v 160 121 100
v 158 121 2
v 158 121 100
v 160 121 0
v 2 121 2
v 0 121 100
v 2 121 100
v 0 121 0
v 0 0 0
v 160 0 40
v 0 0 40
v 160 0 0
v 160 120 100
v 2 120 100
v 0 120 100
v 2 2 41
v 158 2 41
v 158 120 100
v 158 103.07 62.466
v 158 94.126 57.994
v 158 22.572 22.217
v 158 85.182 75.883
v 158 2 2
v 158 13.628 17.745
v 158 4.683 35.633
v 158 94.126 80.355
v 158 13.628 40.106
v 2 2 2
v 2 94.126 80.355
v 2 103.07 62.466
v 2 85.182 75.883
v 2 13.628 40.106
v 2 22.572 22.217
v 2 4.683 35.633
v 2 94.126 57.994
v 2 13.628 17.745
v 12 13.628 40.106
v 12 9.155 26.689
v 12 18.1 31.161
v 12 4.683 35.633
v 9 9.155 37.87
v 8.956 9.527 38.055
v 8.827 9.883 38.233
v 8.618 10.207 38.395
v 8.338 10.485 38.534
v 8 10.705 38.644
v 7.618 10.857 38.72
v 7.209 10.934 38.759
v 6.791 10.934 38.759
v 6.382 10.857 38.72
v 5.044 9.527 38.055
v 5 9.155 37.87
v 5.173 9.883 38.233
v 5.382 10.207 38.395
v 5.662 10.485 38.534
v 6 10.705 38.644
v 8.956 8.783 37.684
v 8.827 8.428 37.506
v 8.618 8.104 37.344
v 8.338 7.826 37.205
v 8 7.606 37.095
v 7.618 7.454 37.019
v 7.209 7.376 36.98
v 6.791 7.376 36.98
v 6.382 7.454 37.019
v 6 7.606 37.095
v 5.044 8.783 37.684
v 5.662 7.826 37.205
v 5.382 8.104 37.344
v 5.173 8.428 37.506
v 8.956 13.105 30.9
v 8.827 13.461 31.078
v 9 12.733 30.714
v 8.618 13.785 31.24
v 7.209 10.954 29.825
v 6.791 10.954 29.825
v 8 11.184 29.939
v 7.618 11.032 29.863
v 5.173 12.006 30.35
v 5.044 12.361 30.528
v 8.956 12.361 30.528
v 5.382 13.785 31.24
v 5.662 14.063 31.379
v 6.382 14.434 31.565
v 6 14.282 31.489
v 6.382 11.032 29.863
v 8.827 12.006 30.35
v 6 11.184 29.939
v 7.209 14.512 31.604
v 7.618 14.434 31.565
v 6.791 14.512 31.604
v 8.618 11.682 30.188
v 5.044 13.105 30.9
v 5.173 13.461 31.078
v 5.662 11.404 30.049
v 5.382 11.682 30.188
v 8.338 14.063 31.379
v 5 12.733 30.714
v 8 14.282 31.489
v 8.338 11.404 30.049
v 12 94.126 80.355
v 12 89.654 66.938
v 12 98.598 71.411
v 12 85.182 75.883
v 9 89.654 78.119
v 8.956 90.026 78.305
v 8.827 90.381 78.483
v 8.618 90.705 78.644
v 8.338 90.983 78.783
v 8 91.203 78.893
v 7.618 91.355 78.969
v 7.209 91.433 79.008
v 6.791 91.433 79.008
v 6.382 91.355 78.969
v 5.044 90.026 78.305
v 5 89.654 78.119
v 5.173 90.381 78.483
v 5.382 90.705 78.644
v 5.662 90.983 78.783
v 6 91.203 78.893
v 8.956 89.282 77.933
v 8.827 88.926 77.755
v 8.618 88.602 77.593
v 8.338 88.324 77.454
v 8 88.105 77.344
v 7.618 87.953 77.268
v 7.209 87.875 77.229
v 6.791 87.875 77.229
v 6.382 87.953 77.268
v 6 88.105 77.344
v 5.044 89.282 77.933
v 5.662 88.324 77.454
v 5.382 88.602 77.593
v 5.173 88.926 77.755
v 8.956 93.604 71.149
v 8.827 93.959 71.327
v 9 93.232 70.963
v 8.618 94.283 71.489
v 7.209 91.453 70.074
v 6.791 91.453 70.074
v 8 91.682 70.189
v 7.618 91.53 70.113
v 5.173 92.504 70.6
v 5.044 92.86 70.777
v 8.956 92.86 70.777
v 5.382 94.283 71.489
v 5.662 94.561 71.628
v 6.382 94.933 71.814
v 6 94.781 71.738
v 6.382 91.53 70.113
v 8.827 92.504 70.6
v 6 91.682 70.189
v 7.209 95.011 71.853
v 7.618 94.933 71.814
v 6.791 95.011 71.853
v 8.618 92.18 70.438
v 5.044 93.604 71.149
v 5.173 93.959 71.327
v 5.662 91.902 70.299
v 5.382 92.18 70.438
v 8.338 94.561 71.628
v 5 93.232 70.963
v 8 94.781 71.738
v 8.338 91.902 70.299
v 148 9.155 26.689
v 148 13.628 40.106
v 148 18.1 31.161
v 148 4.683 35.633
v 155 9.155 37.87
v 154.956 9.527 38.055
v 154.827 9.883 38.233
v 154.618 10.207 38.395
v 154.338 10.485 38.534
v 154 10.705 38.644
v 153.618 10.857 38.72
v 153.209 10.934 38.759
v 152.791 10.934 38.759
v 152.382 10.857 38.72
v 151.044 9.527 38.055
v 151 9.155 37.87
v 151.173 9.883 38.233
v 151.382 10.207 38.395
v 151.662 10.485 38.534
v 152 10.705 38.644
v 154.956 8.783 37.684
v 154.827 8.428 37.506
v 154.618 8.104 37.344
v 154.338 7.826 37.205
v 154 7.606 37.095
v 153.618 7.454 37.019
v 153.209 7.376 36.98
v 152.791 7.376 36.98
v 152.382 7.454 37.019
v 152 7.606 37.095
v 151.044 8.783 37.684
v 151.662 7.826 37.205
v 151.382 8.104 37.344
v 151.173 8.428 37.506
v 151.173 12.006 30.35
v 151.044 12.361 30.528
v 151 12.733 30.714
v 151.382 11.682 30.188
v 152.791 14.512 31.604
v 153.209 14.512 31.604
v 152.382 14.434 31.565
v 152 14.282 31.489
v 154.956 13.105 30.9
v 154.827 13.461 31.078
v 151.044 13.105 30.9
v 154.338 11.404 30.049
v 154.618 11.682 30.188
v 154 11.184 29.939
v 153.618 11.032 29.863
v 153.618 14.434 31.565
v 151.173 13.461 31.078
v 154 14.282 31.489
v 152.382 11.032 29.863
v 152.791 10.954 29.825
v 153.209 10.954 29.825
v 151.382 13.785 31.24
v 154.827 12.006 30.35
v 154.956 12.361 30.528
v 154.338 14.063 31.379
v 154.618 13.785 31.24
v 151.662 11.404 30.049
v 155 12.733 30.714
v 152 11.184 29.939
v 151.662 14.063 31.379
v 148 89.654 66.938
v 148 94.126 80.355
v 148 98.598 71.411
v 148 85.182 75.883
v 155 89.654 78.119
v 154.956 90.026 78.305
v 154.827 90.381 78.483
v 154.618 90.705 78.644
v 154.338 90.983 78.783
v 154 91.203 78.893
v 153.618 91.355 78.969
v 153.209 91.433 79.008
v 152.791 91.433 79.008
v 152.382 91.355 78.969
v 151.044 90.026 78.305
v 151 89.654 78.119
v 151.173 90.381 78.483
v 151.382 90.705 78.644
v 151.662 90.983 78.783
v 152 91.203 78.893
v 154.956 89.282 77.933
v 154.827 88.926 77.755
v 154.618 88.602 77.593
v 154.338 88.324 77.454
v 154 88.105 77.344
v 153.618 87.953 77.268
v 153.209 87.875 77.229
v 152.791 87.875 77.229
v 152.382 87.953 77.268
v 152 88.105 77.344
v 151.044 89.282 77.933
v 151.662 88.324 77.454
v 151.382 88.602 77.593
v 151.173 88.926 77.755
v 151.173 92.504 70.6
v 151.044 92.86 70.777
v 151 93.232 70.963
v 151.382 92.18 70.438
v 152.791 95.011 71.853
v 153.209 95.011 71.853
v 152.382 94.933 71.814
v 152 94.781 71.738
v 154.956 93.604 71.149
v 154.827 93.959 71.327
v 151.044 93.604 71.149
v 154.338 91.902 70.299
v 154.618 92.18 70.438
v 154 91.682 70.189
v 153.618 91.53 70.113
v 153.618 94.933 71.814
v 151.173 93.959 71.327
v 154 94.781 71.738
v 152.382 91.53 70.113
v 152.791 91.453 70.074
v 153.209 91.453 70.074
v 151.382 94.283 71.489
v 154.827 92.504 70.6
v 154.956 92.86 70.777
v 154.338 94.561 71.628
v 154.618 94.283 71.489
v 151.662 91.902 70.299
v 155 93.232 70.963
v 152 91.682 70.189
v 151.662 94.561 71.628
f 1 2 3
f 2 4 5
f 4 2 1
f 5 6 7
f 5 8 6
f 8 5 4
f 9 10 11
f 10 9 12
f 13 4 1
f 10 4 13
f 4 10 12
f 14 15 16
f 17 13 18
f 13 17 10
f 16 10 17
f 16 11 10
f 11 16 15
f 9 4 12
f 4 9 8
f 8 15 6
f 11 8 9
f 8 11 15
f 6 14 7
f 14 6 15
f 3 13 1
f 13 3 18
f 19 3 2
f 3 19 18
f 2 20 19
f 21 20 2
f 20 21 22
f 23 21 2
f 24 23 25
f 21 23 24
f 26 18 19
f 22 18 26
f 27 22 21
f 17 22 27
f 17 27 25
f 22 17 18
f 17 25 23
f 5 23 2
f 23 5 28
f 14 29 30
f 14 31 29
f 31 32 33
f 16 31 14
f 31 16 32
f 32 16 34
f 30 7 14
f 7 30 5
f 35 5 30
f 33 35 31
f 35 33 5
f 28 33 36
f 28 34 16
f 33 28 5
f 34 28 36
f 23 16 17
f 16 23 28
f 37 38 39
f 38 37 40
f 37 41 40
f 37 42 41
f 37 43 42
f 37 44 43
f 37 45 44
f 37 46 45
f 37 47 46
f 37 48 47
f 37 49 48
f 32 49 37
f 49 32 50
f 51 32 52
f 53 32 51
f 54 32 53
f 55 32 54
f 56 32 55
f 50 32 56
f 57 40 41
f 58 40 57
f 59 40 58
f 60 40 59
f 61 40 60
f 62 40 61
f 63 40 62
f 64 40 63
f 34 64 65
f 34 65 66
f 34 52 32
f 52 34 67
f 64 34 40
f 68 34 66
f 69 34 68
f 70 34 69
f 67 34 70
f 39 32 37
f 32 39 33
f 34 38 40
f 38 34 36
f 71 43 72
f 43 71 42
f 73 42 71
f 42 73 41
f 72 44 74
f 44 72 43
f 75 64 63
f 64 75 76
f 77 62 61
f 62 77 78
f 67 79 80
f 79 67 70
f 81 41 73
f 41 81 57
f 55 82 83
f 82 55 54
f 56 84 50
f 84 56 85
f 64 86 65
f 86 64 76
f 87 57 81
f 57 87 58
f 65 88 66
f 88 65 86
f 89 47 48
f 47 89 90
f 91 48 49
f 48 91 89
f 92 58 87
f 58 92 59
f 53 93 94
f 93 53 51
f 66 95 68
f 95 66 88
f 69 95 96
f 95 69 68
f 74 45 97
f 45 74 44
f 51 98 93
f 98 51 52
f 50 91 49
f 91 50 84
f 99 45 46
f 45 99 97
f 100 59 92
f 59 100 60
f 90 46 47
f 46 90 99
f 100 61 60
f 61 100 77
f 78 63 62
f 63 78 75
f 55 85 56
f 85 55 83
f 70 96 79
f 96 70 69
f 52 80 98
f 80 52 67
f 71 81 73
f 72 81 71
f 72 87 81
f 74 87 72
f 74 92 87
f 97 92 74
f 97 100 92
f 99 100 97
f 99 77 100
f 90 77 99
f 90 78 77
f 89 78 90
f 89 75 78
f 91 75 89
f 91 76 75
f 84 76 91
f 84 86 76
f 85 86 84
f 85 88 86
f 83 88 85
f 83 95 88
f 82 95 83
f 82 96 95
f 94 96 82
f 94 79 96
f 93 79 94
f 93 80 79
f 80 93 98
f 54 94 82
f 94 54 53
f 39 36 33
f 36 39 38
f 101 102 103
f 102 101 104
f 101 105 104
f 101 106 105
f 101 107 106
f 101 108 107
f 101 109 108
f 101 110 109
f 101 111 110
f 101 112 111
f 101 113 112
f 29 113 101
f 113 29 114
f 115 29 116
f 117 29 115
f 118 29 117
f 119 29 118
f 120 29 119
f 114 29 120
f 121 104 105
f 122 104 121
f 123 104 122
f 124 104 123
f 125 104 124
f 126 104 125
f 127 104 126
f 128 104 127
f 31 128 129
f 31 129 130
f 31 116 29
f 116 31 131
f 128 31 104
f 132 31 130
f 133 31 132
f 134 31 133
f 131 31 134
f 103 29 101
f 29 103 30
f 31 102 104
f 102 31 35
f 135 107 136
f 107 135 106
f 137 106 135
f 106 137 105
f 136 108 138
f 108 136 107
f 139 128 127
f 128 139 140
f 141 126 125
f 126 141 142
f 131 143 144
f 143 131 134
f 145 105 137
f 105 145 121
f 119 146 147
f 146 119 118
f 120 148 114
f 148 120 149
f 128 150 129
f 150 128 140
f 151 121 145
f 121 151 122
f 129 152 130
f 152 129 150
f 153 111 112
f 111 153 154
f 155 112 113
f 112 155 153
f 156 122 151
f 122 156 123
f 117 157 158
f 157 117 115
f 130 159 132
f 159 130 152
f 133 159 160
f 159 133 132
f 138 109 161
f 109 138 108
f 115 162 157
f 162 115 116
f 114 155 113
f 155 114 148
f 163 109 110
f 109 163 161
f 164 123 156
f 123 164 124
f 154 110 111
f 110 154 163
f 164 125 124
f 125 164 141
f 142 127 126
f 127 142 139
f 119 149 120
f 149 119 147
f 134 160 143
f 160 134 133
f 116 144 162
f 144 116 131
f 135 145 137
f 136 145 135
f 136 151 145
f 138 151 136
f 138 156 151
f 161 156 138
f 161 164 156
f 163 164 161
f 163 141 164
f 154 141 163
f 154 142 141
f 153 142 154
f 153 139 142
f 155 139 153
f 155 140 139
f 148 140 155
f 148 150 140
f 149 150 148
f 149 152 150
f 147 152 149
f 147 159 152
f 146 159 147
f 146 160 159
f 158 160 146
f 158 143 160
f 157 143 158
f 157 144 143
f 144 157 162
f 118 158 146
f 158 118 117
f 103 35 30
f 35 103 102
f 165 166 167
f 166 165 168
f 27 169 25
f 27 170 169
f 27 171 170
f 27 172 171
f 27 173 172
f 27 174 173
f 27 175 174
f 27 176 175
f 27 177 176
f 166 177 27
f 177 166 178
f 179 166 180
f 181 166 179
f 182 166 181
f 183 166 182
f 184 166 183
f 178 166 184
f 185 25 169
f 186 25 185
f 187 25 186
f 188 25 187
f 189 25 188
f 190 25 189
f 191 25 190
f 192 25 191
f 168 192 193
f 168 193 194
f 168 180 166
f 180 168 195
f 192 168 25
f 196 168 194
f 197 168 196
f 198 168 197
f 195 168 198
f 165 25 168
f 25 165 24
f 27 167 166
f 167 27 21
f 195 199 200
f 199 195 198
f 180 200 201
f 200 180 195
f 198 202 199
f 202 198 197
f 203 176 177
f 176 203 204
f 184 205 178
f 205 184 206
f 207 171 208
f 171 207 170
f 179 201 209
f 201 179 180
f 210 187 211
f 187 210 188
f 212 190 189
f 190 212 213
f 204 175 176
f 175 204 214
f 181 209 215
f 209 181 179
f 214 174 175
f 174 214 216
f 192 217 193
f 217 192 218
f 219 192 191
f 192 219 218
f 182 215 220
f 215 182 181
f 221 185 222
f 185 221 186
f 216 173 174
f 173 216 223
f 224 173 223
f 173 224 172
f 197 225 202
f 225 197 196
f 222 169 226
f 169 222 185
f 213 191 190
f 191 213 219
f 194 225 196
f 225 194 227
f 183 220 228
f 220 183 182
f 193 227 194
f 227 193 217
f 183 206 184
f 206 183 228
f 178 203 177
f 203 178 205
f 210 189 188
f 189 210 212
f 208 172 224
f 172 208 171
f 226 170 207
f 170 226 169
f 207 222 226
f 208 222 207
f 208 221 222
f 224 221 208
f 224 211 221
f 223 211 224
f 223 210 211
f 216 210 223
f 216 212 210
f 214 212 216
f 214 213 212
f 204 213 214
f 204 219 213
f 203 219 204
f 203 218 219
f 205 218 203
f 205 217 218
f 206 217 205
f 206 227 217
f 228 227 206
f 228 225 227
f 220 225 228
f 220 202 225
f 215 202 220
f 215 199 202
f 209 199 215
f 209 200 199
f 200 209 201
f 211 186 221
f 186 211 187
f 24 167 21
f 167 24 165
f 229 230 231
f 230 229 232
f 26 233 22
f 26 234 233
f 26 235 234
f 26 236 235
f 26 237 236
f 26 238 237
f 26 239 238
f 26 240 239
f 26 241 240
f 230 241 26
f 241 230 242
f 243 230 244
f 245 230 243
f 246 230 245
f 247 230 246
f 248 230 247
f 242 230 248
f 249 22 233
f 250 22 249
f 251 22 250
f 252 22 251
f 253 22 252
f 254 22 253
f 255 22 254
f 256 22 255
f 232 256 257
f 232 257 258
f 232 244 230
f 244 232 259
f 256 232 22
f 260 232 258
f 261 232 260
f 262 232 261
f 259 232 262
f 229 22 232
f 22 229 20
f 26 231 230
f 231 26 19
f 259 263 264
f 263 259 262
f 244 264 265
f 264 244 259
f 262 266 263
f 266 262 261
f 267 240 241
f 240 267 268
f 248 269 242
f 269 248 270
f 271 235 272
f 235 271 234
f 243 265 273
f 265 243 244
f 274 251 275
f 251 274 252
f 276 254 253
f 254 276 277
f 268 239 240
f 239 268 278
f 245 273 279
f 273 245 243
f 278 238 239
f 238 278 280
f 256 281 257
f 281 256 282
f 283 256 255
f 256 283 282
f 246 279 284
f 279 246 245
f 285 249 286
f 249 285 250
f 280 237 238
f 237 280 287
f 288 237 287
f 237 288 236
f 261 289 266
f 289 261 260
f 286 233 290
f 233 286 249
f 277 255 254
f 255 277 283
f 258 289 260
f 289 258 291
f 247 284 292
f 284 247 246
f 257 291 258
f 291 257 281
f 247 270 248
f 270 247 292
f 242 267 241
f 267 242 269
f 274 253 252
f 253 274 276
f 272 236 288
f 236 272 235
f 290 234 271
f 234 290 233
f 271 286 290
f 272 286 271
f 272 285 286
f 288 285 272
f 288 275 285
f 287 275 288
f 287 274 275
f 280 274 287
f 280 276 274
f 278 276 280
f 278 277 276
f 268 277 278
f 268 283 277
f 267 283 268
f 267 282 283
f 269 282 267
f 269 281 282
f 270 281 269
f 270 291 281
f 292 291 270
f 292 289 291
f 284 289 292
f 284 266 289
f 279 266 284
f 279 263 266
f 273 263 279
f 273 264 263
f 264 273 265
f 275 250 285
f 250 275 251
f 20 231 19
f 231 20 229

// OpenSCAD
width = 160;  // X axis
height = 120;  // Y axis
rear_depth = 100;  // Z axis
front_depth = rear_depth/2.5;
surface_angle = atan2(rear_depth-front_depth, height);
thickness = 2;
front_panel_thickness = 6;

module screw_hole(width, height, depth, diameter) {
    difference() {
        cube([width, height, depth]);
        translate([width/2, height/2, depth/5])
            cylinder(r=diameter/2, h=depth, $fs=0.01);
    }
}

module screw_hole_angle(width, height, depth, diameter) {
    screw_hole(width, height, depth, diameter);
    rotate([90, 0, 0])
        translate([0, 0, -height])
            linear_extrude(height=height)
                polygon(points=[
                    [0, 0],
                    [width, 0],
                    [0, -depth]
                ]);
}

difference() {
    hull() {
        // Front
        cube([width, 1, front_depth]);
        // Back
        translate([0, height, 0])
            cube([width, 1, rear_depth]);
    }
    translate([thickness, thickness, thickness])
        cube([width-(thickness*2), height, rear_depth]);
}

standoff_size = 10;
front_inside_depth = tan(surface_angle)*thickness;
front_panel_holes_x = width-((thickness*2)-standoff_size);
echo("Front panel holes X: ", front_panel_holes_x);
front_panel_holes_y = (height*0.75)-standoff_size;
echo("Front panel holes Y: ", front_panel_holes_y);

translate([thickness, thickness, front_depth+front_inside_depth]) {
    rotate([surface_angle, 0, 0]) translate([0, 0, -standoff_size-front_panel_thickness]) {
        screw_hole_angle(standoff_size, standoff_size, standoff_size, 4);
        translate([0, height*0.75, 0])
            screw_hole_angle(standoff_size, standoff_size, standoff_size, 4);
        translate([width-(thickness*2)-standoff_size, 0, 0])
            rotate([0, 0, 180]) translate([-standoff_size, -standoff_size, 0])
                screw_hole_angle(standoff_size, standoff_size, standoff_size, 4);
        translate([width-(thickness*2)-standoff_size, height*0.75, 0])
            rotate([0, 0, 180]) translate([-standoff_size, -standoff_size, 0])
                screw_hole_angle(standoff_size, standoff_size, standoff_size, 4);
    }
}
